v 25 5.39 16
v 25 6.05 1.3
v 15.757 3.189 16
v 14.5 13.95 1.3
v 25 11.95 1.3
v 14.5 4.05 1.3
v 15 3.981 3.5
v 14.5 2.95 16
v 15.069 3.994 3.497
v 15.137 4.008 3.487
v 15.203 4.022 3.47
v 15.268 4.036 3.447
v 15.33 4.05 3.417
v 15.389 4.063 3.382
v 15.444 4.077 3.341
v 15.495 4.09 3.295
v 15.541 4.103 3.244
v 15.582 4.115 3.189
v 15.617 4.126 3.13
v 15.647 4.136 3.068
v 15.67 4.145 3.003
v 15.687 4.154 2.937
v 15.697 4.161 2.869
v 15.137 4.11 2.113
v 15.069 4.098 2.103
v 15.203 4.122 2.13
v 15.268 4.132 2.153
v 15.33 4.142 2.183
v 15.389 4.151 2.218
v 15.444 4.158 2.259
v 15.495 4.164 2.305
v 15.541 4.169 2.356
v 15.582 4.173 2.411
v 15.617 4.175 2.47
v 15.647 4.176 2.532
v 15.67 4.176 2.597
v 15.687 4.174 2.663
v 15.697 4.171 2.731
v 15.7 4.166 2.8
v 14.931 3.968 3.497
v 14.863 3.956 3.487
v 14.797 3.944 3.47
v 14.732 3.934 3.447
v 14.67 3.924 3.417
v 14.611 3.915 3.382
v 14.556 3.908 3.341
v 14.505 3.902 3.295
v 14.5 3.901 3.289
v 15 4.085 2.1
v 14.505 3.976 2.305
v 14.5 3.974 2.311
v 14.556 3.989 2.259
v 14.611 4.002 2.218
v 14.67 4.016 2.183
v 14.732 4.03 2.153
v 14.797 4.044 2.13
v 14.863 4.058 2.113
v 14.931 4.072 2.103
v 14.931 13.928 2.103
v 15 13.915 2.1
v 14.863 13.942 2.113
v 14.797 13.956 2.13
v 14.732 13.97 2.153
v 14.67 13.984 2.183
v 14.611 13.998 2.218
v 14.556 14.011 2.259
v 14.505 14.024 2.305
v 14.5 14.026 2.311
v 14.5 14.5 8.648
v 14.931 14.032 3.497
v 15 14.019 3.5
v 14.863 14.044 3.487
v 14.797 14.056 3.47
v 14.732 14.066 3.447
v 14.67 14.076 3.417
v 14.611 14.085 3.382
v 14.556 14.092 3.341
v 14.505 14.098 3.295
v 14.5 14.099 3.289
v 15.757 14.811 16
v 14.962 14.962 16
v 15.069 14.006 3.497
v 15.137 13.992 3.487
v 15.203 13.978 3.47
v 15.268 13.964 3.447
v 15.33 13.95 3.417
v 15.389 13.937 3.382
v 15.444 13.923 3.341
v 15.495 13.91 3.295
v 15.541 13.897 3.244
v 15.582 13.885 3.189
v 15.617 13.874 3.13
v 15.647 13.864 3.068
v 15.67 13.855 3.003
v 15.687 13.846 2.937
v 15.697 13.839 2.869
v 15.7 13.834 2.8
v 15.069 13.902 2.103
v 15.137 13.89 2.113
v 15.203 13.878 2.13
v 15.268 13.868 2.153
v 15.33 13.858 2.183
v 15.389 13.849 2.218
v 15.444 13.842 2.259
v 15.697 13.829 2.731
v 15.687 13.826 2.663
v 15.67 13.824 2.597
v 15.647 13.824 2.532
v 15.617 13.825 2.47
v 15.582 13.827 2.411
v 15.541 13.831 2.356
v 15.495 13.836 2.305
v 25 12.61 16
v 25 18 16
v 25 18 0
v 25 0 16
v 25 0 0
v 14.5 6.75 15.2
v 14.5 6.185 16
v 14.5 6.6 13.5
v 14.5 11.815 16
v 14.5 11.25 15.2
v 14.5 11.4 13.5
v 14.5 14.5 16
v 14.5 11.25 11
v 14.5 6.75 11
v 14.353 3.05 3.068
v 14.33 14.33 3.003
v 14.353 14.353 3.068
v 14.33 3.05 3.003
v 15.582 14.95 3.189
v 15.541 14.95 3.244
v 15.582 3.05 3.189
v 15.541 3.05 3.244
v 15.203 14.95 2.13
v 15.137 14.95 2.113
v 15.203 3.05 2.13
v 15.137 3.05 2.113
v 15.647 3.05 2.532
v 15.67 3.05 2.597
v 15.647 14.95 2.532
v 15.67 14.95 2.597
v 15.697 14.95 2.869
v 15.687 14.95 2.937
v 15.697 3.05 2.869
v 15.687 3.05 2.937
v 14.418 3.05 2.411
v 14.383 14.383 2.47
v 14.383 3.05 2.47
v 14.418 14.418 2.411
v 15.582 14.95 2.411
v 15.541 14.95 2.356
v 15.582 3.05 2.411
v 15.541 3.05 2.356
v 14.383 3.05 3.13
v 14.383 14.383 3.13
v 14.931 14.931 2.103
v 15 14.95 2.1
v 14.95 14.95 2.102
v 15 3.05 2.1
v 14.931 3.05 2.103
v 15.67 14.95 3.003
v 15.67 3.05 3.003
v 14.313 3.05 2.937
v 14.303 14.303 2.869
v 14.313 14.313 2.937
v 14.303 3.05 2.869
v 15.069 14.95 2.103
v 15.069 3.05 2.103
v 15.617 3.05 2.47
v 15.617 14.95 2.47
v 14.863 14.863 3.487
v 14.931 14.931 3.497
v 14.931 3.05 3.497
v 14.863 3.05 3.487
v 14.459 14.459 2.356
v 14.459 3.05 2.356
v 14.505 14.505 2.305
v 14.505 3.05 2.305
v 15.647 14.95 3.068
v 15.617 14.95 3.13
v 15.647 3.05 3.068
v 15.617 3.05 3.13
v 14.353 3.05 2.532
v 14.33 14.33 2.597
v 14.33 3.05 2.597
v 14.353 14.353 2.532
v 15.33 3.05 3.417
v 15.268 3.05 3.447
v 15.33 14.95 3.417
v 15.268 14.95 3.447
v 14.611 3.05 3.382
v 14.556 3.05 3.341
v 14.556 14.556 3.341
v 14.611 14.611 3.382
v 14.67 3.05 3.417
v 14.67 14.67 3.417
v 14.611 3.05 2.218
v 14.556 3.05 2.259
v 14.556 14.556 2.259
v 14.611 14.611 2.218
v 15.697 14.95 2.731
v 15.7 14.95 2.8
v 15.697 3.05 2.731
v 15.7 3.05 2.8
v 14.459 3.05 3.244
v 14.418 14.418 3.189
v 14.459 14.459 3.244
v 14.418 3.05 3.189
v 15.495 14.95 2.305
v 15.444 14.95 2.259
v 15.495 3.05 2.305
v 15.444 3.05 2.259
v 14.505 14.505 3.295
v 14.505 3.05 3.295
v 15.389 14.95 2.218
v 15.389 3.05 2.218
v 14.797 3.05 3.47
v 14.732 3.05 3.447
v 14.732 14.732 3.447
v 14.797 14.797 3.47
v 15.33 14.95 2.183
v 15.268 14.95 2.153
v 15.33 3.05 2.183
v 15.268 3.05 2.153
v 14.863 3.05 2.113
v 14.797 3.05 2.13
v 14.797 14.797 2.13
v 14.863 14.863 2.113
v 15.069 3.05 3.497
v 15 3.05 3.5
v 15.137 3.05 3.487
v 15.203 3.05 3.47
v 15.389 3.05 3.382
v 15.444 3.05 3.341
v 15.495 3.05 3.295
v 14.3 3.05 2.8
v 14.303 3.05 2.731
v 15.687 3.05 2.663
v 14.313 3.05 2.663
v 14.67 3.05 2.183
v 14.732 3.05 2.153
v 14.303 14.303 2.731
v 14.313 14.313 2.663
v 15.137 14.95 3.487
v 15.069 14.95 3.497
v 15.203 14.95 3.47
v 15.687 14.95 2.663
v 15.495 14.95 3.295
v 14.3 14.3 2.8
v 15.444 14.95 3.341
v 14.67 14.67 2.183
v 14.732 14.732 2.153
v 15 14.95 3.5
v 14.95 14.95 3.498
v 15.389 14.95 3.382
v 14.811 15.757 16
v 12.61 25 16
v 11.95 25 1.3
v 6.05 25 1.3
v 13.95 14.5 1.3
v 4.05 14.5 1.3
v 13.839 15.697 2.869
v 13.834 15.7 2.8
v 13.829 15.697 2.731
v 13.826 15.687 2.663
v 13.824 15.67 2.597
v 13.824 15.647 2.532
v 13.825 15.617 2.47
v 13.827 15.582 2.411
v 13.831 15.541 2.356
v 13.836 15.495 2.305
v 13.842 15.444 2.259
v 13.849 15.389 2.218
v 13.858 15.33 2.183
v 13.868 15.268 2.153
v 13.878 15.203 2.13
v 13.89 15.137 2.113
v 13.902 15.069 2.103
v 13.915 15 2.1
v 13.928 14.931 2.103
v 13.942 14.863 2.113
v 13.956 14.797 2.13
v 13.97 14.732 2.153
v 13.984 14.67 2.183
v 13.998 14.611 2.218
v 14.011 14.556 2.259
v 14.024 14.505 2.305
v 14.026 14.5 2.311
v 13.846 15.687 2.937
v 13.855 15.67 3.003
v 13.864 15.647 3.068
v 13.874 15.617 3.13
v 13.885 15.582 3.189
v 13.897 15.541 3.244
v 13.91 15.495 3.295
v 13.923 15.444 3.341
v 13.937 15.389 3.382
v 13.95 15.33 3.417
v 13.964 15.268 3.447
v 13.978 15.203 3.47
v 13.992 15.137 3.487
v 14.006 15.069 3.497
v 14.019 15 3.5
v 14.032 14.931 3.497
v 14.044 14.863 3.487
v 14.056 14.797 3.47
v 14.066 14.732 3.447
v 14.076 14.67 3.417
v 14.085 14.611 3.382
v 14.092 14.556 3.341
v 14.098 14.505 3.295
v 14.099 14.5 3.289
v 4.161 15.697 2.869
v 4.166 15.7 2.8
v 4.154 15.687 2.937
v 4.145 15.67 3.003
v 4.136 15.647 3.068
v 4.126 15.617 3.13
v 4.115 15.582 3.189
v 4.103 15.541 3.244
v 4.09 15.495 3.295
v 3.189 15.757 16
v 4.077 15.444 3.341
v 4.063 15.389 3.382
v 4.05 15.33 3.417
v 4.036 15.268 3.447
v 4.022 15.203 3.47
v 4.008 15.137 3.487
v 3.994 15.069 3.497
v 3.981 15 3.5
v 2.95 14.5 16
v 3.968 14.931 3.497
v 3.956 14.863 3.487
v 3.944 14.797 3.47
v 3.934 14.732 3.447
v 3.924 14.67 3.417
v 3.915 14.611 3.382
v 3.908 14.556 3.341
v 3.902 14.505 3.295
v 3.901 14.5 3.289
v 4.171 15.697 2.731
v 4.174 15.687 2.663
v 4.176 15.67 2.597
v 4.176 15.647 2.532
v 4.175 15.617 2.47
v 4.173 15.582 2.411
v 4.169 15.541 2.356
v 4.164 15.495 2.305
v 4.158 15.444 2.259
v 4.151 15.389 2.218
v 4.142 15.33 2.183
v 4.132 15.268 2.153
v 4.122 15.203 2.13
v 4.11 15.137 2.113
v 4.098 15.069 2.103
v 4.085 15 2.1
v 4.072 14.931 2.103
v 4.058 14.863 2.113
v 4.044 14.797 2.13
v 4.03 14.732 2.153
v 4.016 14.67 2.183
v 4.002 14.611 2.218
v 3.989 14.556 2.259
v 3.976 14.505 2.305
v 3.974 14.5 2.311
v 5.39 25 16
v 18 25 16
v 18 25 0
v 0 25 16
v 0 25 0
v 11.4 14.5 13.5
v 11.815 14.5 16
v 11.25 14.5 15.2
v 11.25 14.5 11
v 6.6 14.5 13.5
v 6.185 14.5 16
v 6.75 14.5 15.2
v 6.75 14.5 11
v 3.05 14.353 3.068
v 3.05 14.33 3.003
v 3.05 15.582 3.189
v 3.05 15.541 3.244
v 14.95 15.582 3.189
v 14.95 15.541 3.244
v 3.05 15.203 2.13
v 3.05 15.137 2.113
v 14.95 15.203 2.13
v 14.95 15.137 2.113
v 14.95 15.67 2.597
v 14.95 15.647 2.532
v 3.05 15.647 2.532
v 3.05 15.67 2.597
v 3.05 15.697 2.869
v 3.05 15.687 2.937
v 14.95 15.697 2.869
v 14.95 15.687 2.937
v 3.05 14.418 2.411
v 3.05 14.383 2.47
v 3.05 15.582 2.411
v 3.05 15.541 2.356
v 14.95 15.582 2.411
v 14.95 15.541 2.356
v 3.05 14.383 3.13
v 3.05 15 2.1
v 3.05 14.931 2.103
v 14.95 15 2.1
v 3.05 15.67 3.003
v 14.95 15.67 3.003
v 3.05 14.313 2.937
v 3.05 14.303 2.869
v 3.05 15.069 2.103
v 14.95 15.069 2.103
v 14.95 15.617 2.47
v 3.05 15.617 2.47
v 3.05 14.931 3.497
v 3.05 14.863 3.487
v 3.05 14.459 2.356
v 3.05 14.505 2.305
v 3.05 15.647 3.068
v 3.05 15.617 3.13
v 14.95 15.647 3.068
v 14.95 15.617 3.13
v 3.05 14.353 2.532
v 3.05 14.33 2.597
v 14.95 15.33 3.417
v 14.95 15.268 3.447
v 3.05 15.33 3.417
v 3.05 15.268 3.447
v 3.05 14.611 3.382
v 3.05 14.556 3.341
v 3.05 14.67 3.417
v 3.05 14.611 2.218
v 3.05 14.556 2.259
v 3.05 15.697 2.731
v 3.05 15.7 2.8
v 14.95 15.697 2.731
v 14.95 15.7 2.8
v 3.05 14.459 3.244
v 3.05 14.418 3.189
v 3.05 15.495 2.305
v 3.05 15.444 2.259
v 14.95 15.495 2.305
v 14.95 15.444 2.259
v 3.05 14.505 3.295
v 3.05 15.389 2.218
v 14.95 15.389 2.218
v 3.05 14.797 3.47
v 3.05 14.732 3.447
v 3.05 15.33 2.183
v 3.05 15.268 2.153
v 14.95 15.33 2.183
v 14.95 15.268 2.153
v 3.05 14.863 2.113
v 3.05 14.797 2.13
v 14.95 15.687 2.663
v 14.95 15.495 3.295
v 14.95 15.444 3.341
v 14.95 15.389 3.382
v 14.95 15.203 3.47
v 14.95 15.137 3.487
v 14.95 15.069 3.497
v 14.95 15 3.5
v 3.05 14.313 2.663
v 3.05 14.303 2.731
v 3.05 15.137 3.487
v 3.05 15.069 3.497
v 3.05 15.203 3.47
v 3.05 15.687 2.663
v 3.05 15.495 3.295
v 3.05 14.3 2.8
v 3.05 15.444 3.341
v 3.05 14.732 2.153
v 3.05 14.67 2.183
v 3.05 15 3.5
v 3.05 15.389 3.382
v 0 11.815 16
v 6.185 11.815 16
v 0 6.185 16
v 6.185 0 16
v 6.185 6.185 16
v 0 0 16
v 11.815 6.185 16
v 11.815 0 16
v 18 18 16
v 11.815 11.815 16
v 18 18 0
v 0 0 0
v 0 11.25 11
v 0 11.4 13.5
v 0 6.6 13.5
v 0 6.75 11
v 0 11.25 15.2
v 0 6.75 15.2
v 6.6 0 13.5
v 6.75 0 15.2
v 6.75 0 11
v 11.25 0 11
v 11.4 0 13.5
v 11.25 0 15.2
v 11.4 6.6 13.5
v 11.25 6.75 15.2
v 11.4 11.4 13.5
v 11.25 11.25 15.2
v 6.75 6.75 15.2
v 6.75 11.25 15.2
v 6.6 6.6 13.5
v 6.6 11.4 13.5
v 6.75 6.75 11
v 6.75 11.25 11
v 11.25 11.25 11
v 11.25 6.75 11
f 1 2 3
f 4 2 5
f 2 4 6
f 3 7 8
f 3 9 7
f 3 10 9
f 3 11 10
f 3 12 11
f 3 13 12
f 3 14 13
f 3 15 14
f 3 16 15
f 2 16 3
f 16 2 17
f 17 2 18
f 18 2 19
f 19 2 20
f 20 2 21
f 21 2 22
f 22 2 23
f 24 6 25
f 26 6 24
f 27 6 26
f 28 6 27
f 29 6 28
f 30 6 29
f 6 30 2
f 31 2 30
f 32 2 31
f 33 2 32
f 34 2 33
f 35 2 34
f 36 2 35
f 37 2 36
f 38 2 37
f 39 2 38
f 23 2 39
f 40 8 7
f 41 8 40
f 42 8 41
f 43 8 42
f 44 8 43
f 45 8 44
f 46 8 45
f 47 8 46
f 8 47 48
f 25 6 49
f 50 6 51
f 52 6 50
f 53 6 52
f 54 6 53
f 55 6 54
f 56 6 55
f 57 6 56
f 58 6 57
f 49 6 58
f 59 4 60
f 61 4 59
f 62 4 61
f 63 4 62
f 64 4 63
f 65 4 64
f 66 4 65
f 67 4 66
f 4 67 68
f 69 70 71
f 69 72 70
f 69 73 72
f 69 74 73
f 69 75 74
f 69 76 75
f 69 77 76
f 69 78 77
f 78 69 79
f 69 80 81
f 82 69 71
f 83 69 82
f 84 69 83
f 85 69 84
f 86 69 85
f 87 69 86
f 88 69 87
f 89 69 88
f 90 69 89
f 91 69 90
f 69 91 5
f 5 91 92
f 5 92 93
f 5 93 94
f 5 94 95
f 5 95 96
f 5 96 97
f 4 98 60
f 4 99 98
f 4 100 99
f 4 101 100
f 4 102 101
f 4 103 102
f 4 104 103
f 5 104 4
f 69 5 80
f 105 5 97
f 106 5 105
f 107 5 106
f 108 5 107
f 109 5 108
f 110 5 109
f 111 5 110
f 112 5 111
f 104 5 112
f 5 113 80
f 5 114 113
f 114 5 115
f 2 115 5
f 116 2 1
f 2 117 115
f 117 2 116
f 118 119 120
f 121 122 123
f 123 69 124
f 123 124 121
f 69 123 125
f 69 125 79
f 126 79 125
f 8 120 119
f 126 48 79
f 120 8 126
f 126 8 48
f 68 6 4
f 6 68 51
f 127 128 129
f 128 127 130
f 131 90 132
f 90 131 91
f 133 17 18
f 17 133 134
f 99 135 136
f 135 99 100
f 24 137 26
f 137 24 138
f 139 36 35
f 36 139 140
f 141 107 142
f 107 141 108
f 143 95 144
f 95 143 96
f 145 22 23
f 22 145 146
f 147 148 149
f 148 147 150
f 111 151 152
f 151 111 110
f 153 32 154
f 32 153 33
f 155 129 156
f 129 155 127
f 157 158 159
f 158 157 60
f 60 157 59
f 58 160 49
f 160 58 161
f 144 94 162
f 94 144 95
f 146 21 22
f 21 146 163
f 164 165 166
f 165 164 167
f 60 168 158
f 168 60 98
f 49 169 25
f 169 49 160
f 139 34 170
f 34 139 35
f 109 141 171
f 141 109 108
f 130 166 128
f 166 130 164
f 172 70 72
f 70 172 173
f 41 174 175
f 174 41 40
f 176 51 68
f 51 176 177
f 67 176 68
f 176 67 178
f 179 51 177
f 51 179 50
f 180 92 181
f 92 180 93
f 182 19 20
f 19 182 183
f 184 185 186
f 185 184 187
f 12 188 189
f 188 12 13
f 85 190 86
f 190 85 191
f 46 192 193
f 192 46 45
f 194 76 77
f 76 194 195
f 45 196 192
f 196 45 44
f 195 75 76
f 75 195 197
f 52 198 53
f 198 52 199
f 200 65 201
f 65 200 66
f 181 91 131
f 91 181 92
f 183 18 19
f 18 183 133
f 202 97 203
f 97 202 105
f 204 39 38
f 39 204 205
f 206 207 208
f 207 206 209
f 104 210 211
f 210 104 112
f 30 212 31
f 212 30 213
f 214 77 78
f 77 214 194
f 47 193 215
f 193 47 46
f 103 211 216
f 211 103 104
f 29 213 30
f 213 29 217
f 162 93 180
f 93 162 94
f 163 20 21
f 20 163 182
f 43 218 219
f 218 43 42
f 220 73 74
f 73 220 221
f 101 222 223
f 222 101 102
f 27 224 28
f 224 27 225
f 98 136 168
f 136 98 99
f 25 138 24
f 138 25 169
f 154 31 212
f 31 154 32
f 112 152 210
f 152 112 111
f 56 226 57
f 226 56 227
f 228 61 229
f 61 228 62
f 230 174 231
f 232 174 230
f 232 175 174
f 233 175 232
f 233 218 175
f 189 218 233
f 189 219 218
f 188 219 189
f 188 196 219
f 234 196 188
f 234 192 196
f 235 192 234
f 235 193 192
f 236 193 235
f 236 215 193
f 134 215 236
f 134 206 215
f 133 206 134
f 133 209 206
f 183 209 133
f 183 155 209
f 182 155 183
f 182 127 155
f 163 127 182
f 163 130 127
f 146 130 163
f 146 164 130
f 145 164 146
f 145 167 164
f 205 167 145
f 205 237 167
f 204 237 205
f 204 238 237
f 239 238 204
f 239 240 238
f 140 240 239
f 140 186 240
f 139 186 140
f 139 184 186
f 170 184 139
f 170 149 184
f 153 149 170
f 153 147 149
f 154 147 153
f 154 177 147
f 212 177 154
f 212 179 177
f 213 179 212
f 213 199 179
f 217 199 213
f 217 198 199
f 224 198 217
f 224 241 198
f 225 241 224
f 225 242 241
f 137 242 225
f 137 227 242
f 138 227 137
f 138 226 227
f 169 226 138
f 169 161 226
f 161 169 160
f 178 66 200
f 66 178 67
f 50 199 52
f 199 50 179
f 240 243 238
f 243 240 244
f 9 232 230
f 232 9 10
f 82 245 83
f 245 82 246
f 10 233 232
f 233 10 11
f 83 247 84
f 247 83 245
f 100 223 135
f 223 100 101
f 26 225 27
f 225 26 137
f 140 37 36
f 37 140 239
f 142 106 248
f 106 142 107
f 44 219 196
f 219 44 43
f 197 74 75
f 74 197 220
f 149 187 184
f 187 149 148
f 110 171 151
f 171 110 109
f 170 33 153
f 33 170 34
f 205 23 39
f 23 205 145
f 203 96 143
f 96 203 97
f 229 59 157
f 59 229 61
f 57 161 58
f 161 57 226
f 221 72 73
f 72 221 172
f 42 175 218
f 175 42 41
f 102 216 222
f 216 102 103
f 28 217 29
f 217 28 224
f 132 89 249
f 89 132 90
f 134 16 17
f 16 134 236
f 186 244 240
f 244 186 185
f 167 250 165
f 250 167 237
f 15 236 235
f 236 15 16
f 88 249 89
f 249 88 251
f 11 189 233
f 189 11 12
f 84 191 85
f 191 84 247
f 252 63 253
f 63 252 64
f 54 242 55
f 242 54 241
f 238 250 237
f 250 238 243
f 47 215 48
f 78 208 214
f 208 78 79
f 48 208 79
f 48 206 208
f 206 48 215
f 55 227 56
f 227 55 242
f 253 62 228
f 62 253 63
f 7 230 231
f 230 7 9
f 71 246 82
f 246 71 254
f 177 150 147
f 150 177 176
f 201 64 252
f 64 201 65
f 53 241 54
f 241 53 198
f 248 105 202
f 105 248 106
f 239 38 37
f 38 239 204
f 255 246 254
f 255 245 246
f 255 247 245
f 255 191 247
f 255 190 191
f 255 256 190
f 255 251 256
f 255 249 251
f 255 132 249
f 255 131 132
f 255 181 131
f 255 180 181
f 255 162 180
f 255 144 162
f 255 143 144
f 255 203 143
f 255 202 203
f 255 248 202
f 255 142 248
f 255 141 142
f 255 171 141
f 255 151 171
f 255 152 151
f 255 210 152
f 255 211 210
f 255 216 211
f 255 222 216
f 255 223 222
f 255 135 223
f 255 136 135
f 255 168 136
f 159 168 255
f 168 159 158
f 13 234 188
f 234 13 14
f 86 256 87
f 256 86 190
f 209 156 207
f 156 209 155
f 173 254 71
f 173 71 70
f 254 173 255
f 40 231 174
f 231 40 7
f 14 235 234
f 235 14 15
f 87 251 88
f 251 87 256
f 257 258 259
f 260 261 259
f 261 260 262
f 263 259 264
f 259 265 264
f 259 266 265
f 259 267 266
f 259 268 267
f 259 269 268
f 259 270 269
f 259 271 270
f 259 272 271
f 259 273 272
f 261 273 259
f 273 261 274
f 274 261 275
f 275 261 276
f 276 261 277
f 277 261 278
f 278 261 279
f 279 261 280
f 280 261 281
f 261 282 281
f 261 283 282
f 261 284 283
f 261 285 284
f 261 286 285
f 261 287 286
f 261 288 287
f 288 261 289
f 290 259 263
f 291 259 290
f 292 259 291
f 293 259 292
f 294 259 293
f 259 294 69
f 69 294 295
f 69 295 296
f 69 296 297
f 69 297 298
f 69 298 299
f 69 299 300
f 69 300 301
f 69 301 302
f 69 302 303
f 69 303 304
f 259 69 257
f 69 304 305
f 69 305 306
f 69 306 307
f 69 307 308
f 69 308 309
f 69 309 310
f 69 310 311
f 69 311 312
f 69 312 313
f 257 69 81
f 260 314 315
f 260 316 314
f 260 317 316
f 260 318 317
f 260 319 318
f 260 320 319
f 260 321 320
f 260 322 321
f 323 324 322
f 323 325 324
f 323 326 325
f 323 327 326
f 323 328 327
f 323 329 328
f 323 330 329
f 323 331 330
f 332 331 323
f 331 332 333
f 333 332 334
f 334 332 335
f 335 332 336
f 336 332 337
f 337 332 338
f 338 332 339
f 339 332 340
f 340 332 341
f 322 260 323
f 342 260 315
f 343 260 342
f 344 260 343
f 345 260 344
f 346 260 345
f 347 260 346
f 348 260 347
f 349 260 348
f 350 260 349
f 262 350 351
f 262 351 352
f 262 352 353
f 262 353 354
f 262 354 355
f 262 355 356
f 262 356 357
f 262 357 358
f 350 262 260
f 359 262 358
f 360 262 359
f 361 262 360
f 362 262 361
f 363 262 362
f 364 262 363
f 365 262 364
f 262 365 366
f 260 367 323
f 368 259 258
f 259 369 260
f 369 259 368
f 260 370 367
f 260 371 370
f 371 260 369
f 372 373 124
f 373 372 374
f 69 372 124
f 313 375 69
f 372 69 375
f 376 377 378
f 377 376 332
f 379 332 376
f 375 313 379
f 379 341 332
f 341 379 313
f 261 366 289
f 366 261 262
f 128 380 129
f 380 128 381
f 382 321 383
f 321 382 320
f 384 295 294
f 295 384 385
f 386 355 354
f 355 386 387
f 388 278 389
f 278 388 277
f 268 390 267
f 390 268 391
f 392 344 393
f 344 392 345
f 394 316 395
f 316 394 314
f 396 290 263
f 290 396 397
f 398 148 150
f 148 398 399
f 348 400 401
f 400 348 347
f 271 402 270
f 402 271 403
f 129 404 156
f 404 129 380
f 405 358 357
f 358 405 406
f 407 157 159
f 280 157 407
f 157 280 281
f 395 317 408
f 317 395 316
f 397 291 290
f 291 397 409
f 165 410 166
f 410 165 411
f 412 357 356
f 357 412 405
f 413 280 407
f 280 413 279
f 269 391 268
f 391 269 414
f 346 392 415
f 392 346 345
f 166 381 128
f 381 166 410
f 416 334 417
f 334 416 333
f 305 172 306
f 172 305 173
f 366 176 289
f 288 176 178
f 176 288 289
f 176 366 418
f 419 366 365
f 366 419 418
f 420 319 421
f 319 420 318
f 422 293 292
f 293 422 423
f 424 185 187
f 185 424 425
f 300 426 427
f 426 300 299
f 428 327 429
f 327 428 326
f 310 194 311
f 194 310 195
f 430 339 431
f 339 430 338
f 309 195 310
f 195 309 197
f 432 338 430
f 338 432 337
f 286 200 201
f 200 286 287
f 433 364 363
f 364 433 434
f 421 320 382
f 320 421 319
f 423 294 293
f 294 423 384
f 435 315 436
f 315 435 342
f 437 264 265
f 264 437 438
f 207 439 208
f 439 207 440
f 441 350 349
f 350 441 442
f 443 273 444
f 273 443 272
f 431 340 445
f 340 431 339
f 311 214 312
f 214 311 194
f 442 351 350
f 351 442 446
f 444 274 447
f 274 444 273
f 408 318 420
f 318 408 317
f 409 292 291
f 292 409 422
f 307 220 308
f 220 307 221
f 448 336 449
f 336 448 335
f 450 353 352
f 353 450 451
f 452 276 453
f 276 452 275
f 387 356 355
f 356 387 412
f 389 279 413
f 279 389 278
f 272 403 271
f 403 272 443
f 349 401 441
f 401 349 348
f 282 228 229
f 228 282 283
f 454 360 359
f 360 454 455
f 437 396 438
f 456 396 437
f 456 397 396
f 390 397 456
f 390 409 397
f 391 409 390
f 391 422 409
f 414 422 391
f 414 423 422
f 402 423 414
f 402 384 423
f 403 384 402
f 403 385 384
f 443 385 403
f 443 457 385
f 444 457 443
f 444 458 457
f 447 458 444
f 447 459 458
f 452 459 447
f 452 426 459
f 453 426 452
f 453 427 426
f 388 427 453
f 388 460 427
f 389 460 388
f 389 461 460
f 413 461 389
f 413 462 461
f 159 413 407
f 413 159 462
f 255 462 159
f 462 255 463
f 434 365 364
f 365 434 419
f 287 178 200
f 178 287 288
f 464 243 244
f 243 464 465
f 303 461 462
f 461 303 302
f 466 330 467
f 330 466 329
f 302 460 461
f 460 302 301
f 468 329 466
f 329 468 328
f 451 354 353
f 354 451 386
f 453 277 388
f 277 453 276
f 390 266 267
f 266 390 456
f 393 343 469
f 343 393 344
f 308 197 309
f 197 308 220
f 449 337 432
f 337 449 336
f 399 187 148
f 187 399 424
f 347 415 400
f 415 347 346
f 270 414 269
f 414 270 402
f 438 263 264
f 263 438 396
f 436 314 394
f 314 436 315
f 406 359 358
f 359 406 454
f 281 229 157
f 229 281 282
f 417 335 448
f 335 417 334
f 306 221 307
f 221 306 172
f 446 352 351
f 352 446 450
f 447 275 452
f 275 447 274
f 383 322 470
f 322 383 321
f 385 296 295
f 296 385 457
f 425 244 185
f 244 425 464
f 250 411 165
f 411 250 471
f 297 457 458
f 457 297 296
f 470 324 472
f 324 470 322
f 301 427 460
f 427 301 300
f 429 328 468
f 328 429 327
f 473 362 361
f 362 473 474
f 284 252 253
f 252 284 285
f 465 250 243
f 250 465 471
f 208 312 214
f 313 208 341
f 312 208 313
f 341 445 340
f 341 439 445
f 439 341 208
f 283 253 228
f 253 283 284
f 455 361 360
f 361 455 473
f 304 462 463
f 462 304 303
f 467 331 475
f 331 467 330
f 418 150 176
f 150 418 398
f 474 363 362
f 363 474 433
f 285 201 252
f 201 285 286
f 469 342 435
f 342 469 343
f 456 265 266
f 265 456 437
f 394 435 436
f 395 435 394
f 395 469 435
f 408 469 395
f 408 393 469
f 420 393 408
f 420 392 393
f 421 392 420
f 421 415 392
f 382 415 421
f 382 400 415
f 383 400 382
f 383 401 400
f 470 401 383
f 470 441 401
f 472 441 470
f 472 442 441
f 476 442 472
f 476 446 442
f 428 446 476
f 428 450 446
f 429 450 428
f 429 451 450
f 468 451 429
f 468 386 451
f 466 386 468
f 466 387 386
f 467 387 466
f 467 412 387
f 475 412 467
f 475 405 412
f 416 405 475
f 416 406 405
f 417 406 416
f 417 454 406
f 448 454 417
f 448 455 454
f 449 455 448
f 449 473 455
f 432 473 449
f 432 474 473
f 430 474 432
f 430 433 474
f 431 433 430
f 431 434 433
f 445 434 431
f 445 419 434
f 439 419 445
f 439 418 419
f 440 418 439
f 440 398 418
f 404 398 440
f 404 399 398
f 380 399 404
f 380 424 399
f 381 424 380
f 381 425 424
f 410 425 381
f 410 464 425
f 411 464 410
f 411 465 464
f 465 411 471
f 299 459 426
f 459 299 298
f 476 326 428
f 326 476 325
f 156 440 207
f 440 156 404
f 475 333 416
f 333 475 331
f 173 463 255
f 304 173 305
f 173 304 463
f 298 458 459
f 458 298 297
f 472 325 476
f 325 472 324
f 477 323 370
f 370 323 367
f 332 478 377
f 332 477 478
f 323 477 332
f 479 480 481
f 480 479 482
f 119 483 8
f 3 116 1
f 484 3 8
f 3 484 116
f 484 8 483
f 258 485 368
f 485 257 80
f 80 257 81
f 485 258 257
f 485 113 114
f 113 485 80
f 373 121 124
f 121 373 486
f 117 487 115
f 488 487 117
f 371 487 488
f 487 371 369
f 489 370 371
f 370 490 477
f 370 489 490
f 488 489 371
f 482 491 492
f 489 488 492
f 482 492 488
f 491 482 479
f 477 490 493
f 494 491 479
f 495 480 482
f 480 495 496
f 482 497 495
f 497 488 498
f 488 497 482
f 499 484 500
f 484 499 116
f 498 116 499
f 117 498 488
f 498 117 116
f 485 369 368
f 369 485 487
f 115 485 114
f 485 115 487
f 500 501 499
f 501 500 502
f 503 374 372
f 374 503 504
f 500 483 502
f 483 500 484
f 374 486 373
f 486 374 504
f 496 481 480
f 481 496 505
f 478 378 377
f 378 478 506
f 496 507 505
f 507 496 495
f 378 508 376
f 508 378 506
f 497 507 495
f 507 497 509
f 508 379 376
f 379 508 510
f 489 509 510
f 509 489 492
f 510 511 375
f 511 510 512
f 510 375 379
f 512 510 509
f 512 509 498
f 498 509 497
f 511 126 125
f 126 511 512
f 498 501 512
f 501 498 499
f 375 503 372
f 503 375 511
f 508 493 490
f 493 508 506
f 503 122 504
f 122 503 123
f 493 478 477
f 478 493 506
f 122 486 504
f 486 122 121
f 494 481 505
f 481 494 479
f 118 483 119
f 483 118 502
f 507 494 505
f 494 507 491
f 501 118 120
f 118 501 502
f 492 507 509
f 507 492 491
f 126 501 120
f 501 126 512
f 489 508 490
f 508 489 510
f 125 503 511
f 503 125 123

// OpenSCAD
// file: ../modules/spline_profile.scad
// ====================================================================
// Cellophane Spline Groove & Compliant Spring Clamping Strip Module
// High-tension retention system with compliant split-core spring prongs
// and directional grip teeth to hold cellophane drum-tight without slipping
// ====================================================================
include <../config.scad>

// Negative volume for cutting the spline groove into any beam surface
// Cuts into the -Z direction from Z=0.
// Axis parameter: "Y" (default) or "X"
module spline_groove_negative(length = 100, axis = "Y") {
    gw = GROOVE_WIDTH; // 4.5 mm
    gd = GROOVE_DEPTH; // 5.0 mm
    
    // Cross-section profile of the groove (in X-Z plane)
    // Features a 45° lead-in chamfer at the mouth and internal retention undercuts
    module groove_cross_section_2d() {
        polygon(points = [
            [-(gw/2 + 0.6),  0.05], // Mouth chamfer outer left
            [-gw/2,         -0.80], // Mouth chamfer inner left
            [-gw/2 - 0.15,  -2.50], // Mid retention undercut left
            [-gw/2,         -gd],   // Bottom left
            [ gw/2,         -gd],   // Bottom right
            [ gw/2 + 0.15,  -2.50], // Mid retention undercut right
            [ gw/2,         -0.80], // Mouth chamfer inner right
            [ (gw/2 + 0.6),  0.05]  // Mouth chamfer outer right
        ]);
    }
    
    if (axis == "Y") {
        rotate([90, 0, 0])
        linear_extrude(height = length, center = true) {
            groove_cross_section_2d();
        }
    } else {
        rotate([0, 90, 0])
        rotate([0, 0, 90])
        linear_extrude(height = length, center = true) {
            groove_cross_section_2d();
        }
    }
}

// 2D Profile of the Compliant Spring-Wedge Spline Clip (X-Z plane)
// Has a central vertical expansion slot that allows the two prongs to flex inward
// during insertion and exert continuous outward spring pressure against the cellophane.
module spline_clip_profile_2d(width_offset = 0) {
    w_cap   = 7.0; // Top thumb-press cap width
    h_cap   = 1.8; // Cap thickness
    h_depth = 4.6; // Insertion depth
    
    // Base dimensions + user/grip offset
    w_shaft = 4.3 + width_offset; // Base shaft (tight fit in 4.5mm groove)
    w_barb1 = 4.7 + width_offset; // Upper retention barb (interferes with groove)
    w_barb2 = 4.8 + width_offset; // Lower primary clamping barb
    w_nose  = 3.2;                // Lead-in nose
    
    difference() {
        union() {
            // 1. Top Thumb-Press Cap (acts as depth stop & pry lip)
            translate([0, h_cap / 2])
            hull() {
                translate([-w_cap/2 + 0.8, -h_cap/2 + 0.4]) circle(r = 0.4, $fn=16);
                translate([ w_cap/2 - 0.8, -h_cap/2 + 0.4]) circle(r = 0.4, $fn=16);
                translate([-w_cap/2 + 1.2,  h_cap/2 - 0.4]) circle(r = 0.4, $fn=16);
                translate([ w_cap/2 - 1.2,  h_cap/2 - 0.4]) circle(r = 0.4, $fn=16);
            }
            
            // 2. Dual-Barb Clamping Prongs
            polygon(points = [
                [-w_shaft/2,        0.0],
                [-w_shaft/2,       -1.2],
                [-w_barb1/2,       -1.9], // Upper barb tooth
                [-w_shaft/2,       -2.1],
                [-w_shaft/2,       -2.8],
                [-w_barb2/2,       -3.5], // Lower primary clamping tooth
                [-w_nose/2,        -h_depth], // Tapered nose
                [ w_nose/2,        -h_depth],
                [ w_barb2/2,       -3.5],
                [ w_shaft/2,       -2.8],
                [ w_shaft/2,       -2.1],
                [ w_barb1/2,       -1.9],
                [ w_shaft/2,       -1.2],
                [ w_shaft/2,        0.0]
            ]);
        }
        
        // 3. Central Vertical Expansion Kerf (0.9 mm compliant flex slot)
        // Splits the shaft into two spring prongs that flex inward upon insertion
        translate([0, -h_depth/2 - 0.6])
        hull() {
            translate([0,  h_depth/2 - 1.2]) circle(r = 0.45, $fn=16);
            translate([0, -h_depth/2 + 0.5]) circle(r = 0.45, $fn=16);
        }
    }
}

// 3D Snap-in Locking Spline Clip (oriented along Y axis by default)
module spline_clip(length = 150, axis = "Y", width_offset = 0) {
    if (axis == "Y") {
        rotate([90, 0, 0])
        linear_extrude(height = length, center = true) {
            spline_clip_profile_2d(width_offset = width_offset);
        }
    } else {
        rotate([0, 90, 0])
        rotate([0, 0, 90])
        linear_extrude(height = length, center = true) {
            spline_clip_profile_2d(width_offset = width_offset);
        }
    }
}
// file: ../modules/dovetail.scad
// ====================================================================
// Dual-Taper Wedge Dovetail Module (Peg-Free, Self-Locking)
// Main Frame Wedge & Mini Door Wedge Systems
// ====================================================================
include <../config.scad>

// 2D Profile of Dovetail Slice in X-Y plane
module dovetail_slice_2d(root_w, tip_w, depth) {
    w_r = root_w / 2;
    w_t = tip_w / 2;
    polygon(points = [
        [-w_r, 0],
        [-w_t, depth],
        [ w_t, depth],
        [ w_r, 0]
    ]);
}

// ----------------------------------------------------
// 1. Main Frame Dual-Taper Wedge Dovetail (24 x 24 mm Profile)
// ----------------------------------------------------
module male_dovetail(
    w = BEAM_WIDTH,
    h = BEAM_HEIGHT,
    depth = DOVETAIL_DEPTH,
    tol = 0
) {
    z_bot = -h/2 + 2.0 + tol; // 2mm bottom ledge
    z_top =  h/2 - tol;       // Flush at top of beam
    
    b_root = FRAME_BOT_ROOT - 2*tol;
    b_tip  = FRAME_BOT_TIP  - 2*tol;
    t_root = FRAME_TOP_ROOT - 2*tol;
    t_tip  = FRAME_TOP_TIP  - 2*tol;
    
    union() {
        hull() {
            translate([0, 0, z_bot])
            linear_extrude(height = 0.5)
            dovetail_slice_2d(b_root, b_tip, depth);
            
            translate([0, 0, z_top - 0.5])
            linear_extrude(height = 0.5)
            dovetail_slice_2d(t_root, t_tip, depth);
        }
        
        // Tactile snap detent bead on the tip face at the bottom
        translate([0, depth, z_bot + 2.0])
        rotate([0, 90, 0])
        cylinder(r = 0.6, h = b_tip - 2, center = true);
    }
}

module female_dovetail_pocket(
    w = BEAM_WIDTH,
    h = BEAM_HEIGHT,
    depth = DOVETAIL_DEPTH,
    tol = TOL_DOVETAIL
) {
    z_bot = -h/2 + 2.0 - tol;
    z_top =  h/2 + 2.0; // Open through top
    
    b_root = FRAME_BOT_ROOT + 2*tol;
    b_tip  = FRAME_BOT_TIP  + 2*tol;
    t_root = FRAME_TOP_ROOT + 2*tol;
    t_tip  = FRAME_TOP_TIP  + 2*tol;
    
    union() {
        mirror([0, 1, 0])
        hull() {
            translate([0, 0, z_bot])
            linear_extrude(height = 0.5)
            dovetail_slice_2d(b_root, b_tip, depth + 0.6);
            
            translate([0, 0, z_top])
            linear_extrude(height = 0.5)
            dovetail_slice_2d(t_root, t_tip, depth + 0.6);
        }
        
        // Matching snap detent groove in the pocket floor
        translate([0, -depth, z_bot + 2.0])
        rotate([0, 90, 0])
        cylinder(r = 0.8, h = b_tip + 2, center = true);
    }
}

// ----------------------------------------------------
// 2. Mini Door Dual-Taper Wedge Dovetail (18 x 16 mm Profile)
// ----------------------------------------------------
module mini_male_dovetail(
    w = DOOR_PROFILE_W,
    h = DOOR_PROFILE_T,
    depth = DOOR_DEPTH,
    tol = 0
) {
    z_bot = -h/2 + 1.5 + tol;
    z_top =  h/2 - tol;
    
    b_root = DOOR_BOT_ROOT - 2*tol;
    b_tip  = DOOR_BOT_TIP  - 2*tol;
    t_root = DOOR_TOP_ROOT - 2*tol;
    t_tip  = DOOR_TOP_TIP  - 2*tol;
    
    union() {
        hull() {
            translate([0, 0, z_bot])
            linear_extrude(height = 0.5)
            dovetail_slice_2d(b_root, b_tip, depth);
            
            translate([0, 0, z_top - 0.5])
            linear_extrude(height = 0.5)
            dovetail_slice_2d(t_root, t_tip, depth);
        }
        
        // Snap detent bead
        translate([0, depth, z_bot + 1.5])
        rotate([0, 90, 0])
        cylinder(r = 0.5, h = b_tip - 1.5, center = true);
    }
}

module mini_female_dovetail_pocket(
    w = DOOR_PROFILE_W,
    h = DOOR_PROFILE_T,
    depth = DOOR_DEPTH,
    tol = TOL_DOVETAIL
) {
    z_bot = -h/2 + 1.5 - tol;
    z_top =  h/2 + 2.0; // Open through top
    
    b_root = DOOR_BOT_ROOT + 2*tol;
    b_tip  = DOOR_BOT_TIP  + 2*tol;
    t_root = DOOR_TOP_ROOT + 2*tol;
    t_tip  = DOOR_TOP_TIP  + 2*tol;
    
    union() {
        mirror([0, 1, 0])
        hull() {
            translate([0, 0, z_bot])
            linear_extrude(height = 0.5)
            dovetail_slice_2d(b_root, b_tip, depth + 0.5);
            
            translate([0, 0, z_top])
            linear_extrude(height = 0.5)
            dovetail_slice_2d(t_root, t_tip, depth + 0.5);
        }
        
        // Matching detent groove
        translate([0, -depth, z_bot + 1.5])
        rotate([0, 90, 0])
        cylinder(r = 0.7, h = b_tip + 2, center = true);
    }
}
// file: ../config.scad
// ====================================================================
// Bambu Lab A1 Enclosure - Global Configuration Parameters
// Ultra-Minimal 8-Part Modular Kit (Face-Overlay Architecture)
// ====================================================================

// --- Print Bed Limits ---
MAX_PRINT_X = 256;
MAX_PRINT_Y = 256;
MAX_PRINT_Z = 256;
SAFE_PART_MAX_LEN = 240; // Conservative safety margin for brims

// --- Internal Enclosure Dimensions (mm) ---
// Sized for Bambu Lab A1 bed-slinger travel, right poop bucket, and top BMCU 370c
INTERNAL_WIDTH  = 560; // X axis clearance (A1 + toolhead + right poop bucket)
INTERNAL_DEPTH  = 580; // Y axis clearance (Bed travel + rear cable loop buffer)
INTERNAL_HEIGHT = 710; // Z axis clearance (Gantry + BMCU 370c rotating mount + spool)

// --- Standardized Modular Grid Lengths ---
FRAME_EDGE_LEN  = 185.0; // Standardized length for ALL frame edge segments
DOOR_EDGE_LEN   = 138.0; // Standardized length for ALL door/roof edge segments

// --- Frame Profile Dimensions ---
BEAM_WIDTH   = 24.0;  // Frame beam width X/Y (mm)
BEAM_HEIGHT  = 24.0;  // Frame beam height Z (mm)
CORNER_SIZE  = 36.0;  // 3-way cubic corner junction dimension

// --- Door Profile Dimensions (Slim Face-Overlay) ---
DOOR_PROFILE_W = 18.0; // Width across door frame face (mm)
DOOR_PROFILE_T = 16.0; // Thickness of door frame (mm)
DOOR_CORNER_W  = 25.0; // L-shaped door corner block dimension (mm)

// --- Tolerances (FDM 3D Printing tuned for Bambu Lab A1 0.4mm nozzle) ---
TOL_TIGHT    = 0.15; // Tight press fit (spline clips)
TOL_DOVETAIL = 0.20; // Sliding interlock fit (wedge dovetails)
TOL_HINGE    = 0.30; // Free rotating hinge pins
TOL_LOOSE    = 0.40; // Clearance gaps

// --- Cellophane Spline Groove Specifications ---
GROOVE_WIDTH  = 4.5; // Width of U-channel
GROOVE_DEPTH  = 5.0; // Depth of U-channel

// --- Peg-Free Dual-Taper Wedge Dovetail Dimensions ---
DOVETAIL_DEPTH = 15.0; // Length of wedge insert (mm)

// Main Frame Wedge Dovetail
FRAME_BOT_ROOT = 7.5;  // Bottom root width (narrow entry)
FRAME_BOT_TIP  = 13.5; // Bottom tip width
FRAME_TOP_ROOT = 9.5;  // Top root width (wide wedge lock)
FRAME_TOP_TIP  = 16.5; // Top tip width

// Mini Door Wedge Dovetail (scaled for 18x16 mm door profile)
DOOR_BOT_ROOT  = 5.5;
DOOR_BOT_TIP   = 9.5;
DOOR_TOP_ROOT  = 7.0;
DOOR_TOP_TIP   = 12.0;
DOOR_DEPTH     = 10.0;

// --- Filament PTFE Tube Routing (Bottom Side Beam) ---
PTFE_TUBE_OD  = 4.0; // Standard PTFE bowden tube outer diameter (mm)
PTFE_HOLE_DIA = 4.3; // Slip-fit through-hole diameter with retention grip
PTFE_TUBE_CNT = 4;   // 4 dedicated filament tubes for multi-material / drybox
PTFE_ANGLE    = 35;  // Upward angle toward toolhead/BMCU (degrees)

// --- Render Quality ($fn) ---
$fn = $preview ? 24 : 64;
// main file
// ====================================================================
// 5. Door L-Corner Block (Part 5 of 8)
// 90° Corner block for modular slim door leaves (18 x 16 mm profile)
// Features 2 mini female wedge dovetail sockets
// ====================================================================
include <../config.scad>
use <../modules/dovetail.scad>
use <../modules/spline_profile.scad>

module door_corner() {
    cw = DOOR_CORNER_W; // 25 mm
    pw = DOOR_PROFILE_W; // 18 mm
    pt = DOOR_PROFILE_T; // 16 mm
    
    difference() {
        // L-shaped corner body
        cube([cw, cw, pt], center = false);
        
        // Inner corner cutout
        translate([pw, pw, -1])
        cube([cw, cw, pt + 2], center = false);
        
        // Mini female wedge socket on +X face (recesses into -X)
        translate([cw, pw/2, pt/2])
        rotate([0, 0, -90])
        mini_female_dovetail_pocket(w = pw, h = pt);
        
        // Mini female wedge socket on +Y face (recesses into -Y)
        translate([pw/2, cw, pt/2])
        mini_female_dovetail_pocket(w = pw, h = pt);
        
        // Spline groove on front (+Z) face around corner
        translate([pw/2, cw/2, pt])
        spline_groove_negative(length = cw + 2, axis = "Y");
        
        translate([cw/2, pw/2, pt])
        spline_groove_negative(length = cw + 2, axis = "X");
    }
}

// Standalone preview
door_corner();
